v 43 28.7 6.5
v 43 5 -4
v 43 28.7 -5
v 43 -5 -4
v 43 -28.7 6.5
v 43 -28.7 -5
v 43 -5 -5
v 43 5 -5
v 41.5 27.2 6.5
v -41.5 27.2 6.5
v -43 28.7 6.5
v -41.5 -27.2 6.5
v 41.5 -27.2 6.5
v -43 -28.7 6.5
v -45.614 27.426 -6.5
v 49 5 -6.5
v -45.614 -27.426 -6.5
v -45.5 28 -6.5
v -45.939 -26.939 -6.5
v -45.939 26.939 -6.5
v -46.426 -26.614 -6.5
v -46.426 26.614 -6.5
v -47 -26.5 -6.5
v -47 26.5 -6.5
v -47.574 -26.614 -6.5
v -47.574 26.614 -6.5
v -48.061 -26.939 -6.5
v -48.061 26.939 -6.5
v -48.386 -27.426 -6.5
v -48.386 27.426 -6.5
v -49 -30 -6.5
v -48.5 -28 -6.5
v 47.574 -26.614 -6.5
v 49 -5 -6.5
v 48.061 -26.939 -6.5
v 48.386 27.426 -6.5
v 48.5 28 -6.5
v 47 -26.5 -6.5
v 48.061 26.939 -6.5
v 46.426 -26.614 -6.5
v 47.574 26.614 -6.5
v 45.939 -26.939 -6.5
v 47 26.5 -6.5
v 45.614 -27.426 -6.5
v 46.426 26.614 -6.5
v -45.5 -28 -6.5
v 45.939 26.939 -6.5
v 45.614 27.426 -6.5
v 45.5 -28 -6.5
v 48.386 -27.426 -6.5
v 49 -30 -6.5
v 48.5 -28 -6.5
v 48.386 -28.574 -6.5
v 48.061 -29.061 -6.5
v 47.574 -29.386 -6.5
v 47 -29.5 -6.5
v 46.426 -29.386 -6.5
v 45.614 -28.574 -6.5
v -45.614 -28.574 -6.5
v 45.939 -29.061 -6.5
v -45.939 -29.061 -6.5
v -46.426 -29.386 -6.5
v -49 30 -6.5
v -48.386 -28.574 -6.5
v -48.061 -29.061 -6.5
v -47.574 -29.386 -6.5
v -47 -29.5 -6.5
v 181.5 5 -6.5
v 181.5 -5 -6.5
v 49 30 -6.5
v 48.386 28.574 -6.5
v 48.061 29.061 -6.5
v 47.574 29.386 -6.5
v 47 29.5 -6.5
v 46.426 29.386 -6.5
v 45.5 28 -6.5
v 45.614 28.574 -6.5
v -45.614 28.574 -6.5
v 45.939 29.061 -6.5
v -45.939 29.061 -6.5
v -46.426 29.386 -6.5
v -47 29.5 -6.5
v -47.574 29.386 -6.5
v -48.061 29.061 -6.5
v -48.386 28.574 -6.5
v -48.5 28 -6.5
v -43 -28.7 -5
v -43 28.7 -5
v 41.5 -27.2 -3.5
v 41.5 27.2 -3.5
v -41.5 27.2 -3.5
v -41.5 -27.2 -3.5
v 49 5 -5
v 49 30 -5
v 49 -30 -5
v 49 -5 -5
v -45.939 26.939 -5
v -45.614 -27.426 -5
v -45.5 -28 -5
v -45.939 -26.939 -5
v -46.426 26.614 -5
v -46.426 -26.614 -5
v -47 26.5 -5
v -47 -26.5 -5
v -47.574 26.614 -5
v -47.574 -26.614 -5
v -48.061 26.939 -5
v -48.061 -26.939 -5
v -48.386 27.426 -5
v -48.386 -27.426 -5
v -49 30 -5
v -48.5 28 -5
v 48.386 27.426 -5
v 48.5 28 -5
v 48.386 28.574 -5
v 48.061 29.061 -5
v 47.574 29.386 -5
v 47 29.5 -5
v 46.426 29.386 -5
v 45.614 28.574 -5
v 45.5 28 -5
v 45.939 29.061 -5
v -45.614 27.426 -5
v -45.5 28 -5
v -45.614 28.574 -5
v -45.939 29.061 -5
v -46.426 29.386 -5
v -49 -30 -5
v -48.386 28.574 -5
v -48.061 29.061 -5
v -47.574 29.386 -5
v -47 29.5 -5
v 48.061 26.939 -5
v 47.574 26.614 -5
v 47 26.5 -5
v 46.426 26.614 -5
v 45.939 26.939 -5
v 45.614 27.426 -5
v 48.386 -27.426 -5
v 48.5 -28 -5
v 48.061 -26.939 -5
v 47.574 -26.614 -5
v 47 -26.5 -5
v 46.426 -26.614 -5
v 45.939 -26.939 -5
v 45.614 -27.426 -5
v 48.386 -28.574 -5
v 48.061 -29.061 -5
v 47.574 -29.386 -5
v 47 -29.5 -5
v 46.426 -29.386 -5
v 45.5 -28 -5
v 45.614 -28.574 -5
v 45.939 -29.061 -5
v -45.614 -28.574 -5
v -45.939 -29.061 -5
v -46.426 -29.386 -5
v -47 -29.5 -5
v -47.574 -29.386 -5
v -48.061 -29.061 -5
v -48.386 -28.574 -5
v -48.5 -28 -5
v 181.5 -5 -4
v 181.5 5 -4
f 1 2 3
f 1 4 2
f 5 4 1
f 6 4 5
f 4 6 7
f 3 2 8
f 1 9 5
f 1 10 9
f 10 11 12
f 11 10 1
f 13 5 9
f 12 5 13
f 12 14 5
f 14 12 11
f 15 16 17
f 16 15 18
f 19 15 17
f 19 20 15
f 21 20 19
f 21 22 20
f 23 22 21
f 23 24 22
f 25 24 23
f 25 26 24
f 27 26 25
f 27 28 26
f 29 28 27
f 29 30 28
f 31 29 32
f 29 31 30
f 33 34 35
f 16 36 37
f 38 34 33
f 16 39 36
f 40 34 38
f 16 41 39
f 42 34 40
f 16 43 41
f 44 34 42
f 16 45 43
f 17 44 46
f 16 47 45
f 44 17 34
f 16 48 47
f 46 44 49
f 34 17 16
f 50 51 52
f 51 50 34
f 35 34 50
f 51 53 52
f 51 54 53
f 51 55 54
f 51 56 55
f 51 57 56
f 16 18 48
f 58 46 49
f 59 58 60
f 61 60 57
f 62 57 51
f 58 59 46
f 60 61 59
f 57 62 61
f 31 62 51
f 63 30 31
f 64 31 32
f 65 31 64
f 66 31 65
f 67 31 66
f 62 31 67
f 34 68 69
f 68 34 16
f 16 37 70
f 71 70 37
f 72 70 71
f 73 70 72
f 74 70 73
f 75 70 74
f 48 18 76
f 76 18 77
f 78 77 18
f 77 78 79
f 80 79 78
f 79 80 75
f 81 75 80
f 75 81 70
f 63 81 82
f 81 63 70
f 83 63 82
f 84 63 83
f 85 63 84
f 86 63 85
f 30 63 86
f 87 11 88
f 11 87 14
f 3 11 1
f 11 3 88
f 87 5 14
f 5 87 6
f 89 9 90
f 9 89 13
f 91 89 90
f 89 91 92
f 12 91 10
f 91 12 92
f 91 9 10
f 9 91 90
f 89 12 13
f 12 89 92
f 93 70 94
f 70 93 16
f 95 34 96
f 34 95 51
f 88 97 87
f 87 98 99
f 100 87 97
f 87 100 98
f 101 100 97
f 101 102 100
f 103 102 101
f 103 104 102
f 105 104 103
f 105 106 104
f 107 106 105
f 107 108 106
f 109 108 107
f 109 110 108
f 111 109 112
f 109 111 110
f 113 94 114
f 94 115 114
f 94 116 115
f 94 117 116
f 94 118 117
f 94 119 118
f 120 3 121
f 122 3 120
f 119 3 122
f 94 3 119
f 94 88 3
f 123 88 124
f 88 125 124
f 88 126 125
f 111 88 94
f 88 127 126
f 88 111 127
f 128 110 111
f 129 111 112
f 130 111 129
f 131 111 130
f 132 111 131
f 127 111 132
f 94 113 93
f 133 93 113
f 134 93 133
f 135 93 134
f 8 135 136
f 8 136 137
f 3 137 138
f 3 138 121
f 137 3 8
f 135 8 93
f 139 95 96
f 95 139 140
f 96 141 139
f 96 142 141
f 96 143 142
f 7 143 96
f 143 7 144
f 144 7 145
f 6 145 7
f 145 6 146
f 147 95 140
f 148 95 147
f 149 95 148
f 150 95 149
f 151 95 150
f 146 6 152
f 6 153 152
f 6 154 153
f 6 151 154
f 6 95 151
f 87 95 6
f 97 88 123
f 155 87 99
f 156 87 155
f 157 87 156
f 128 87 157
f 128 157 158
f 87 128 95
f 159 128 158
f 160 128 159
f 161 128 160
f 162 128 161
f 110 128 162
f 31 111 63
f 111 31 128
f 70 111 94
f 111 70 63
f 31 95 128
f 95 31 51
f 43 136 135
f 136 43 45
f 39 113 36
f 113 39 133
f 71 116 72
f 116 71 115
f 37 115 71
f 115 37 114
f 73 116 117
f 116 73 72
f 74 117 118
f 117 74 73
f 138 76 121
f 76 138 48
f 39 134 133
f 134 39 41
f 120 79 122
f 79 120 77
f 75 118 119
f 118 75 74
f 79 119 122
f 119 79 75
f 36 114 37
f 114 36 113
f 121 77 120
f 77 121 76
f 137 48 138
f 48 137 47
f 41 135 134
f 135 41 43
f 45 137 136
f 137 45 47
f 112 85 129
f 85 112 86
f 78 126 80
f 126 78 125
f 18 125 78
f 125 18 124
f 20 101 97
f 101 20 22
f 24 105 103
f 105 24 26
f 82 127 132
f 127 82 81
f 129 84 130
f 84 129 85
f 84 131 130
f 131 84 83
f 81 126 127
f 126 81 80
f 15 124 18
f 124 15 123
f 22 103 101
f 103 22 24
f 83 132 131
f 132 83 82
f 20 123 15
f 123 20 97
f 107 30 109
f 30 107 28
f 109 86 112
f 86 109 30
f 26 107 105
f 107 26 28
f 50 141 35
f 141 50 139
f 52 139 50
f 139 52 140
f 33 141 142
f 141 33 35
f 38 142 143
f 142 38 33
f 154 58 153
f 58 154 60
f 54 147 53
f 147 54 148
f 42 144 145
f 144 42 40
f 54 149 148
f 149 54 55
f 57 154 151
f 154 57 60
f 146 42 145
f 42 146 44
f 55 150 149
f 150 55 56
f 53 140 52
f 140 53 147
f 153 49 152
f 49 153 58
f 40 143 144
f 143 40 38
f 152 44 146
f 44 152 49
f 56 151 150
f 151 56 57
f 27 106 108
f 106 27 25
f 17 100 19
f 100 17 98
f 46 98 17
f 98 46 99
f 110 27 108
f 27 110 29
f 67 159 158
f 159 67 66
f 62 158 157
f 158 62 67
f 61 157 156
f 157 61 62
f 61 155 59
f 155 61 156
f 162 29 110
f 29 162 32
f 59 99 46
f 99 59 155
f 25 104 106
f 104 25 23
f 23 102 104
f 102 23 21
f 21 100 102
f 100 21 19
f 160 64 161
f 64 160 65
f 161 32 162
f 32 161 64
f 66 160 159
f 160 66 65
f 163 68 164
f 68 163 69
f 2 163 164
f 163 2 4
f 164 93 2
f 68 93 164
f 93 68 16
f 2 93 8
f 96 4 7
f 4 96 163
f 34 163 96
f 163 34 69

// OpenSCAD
board_length = 83.0;
board_width = 54.4;
board_depth = 10.0;

lcd_length = 98.0;
lcd_width = 60.0;
lcd_support_height = 40;
lcd_support_radius = 4.0 / 2.0;
lcd_support_stub_radius = 2.5 / 2.0;
lcd_support_stub_height = 2.0;
lcd_support_screw_radius = 3.0 / 2.0;

sensor_support_length = 140;
sensor_support_width = 10;
sensor_support_thickness = 2.5;

fn = 16;
margin = 1.5;

support_length_offset = (lcd_length / 2.0) -
                         lcd_support_radius;
support_width_offset = (lcd_width / 2.0) -
                         lcd_support_radius;
base_depth = (board_depth + margin) / 2.0;

module support_column(l_modifier, w_modifier) {
  translate([l_modifier*support_length_offset, 
             w_modifier*support_width_offset,
            -base_depth])
  cylinder(h = lcd_support_height,
           r1 = lcd_support_radius,
           r2 = lcd_support_radius, $fn=fn);
  translate([l_modifier*support_length_offset, 
             w_modifier*support_width_offset,
            lcd_support_height - base_depth])
  cylinder(h = lcd_support_stub_height,
           r1 = lcd_support_stub_radius,
           r2 = lcd_support_stub_radius, $fn=fn);
}

module screw_hole(l_modifier, w_modifier) {
  translate([l_modifier*support_length_offset, 
             w_modifier*support_width_offset,
            -(base_depth + margin)])
  cylinder(h = margin*2,
           r1 = lcd_support_screw_radius,
           r2 = lcd_support_screw_radius, $fn=fn);
}

module sensor_support() {
  sensor_length_offset = (sensor_support_length / 2.0) +
                         (board_length / 2.0);
  sensor_depth_offset = (base_depth -
                         sensor_support_thickness/2.0
                         + margin/2.0);
  translate([sensor_length_offset, 0, -sensor_depth_offset])
  cube(size = [sensor_support_length,
               sensor_support_width,
               sensor_support_thickness], center=true);
}

module render() {
  union() {
    difference() {
      cube(size = [board_length + margin*2,
                   board_width + margin*2,
                   board_depth + margin*2], center=true);
      translate([0, 0, margin])
      cube(size = [board_length,
                   board_width,
                   board_depth], center=true);
    }
    difference() {
    translate([0, 0, -base_depth ])
    cube(size = [lcd_length,
                 lcd_width,
                 margin], center=true);
      screw_hole(+1.0, +1.0);
      screw_hole(-1.0, +1.0);
      screw_hole(+1.0, -1.0);
      screw_hole(-1.0, -1.0);
    }

    sensor_support();
  }
}

echo(version=version());

render();
